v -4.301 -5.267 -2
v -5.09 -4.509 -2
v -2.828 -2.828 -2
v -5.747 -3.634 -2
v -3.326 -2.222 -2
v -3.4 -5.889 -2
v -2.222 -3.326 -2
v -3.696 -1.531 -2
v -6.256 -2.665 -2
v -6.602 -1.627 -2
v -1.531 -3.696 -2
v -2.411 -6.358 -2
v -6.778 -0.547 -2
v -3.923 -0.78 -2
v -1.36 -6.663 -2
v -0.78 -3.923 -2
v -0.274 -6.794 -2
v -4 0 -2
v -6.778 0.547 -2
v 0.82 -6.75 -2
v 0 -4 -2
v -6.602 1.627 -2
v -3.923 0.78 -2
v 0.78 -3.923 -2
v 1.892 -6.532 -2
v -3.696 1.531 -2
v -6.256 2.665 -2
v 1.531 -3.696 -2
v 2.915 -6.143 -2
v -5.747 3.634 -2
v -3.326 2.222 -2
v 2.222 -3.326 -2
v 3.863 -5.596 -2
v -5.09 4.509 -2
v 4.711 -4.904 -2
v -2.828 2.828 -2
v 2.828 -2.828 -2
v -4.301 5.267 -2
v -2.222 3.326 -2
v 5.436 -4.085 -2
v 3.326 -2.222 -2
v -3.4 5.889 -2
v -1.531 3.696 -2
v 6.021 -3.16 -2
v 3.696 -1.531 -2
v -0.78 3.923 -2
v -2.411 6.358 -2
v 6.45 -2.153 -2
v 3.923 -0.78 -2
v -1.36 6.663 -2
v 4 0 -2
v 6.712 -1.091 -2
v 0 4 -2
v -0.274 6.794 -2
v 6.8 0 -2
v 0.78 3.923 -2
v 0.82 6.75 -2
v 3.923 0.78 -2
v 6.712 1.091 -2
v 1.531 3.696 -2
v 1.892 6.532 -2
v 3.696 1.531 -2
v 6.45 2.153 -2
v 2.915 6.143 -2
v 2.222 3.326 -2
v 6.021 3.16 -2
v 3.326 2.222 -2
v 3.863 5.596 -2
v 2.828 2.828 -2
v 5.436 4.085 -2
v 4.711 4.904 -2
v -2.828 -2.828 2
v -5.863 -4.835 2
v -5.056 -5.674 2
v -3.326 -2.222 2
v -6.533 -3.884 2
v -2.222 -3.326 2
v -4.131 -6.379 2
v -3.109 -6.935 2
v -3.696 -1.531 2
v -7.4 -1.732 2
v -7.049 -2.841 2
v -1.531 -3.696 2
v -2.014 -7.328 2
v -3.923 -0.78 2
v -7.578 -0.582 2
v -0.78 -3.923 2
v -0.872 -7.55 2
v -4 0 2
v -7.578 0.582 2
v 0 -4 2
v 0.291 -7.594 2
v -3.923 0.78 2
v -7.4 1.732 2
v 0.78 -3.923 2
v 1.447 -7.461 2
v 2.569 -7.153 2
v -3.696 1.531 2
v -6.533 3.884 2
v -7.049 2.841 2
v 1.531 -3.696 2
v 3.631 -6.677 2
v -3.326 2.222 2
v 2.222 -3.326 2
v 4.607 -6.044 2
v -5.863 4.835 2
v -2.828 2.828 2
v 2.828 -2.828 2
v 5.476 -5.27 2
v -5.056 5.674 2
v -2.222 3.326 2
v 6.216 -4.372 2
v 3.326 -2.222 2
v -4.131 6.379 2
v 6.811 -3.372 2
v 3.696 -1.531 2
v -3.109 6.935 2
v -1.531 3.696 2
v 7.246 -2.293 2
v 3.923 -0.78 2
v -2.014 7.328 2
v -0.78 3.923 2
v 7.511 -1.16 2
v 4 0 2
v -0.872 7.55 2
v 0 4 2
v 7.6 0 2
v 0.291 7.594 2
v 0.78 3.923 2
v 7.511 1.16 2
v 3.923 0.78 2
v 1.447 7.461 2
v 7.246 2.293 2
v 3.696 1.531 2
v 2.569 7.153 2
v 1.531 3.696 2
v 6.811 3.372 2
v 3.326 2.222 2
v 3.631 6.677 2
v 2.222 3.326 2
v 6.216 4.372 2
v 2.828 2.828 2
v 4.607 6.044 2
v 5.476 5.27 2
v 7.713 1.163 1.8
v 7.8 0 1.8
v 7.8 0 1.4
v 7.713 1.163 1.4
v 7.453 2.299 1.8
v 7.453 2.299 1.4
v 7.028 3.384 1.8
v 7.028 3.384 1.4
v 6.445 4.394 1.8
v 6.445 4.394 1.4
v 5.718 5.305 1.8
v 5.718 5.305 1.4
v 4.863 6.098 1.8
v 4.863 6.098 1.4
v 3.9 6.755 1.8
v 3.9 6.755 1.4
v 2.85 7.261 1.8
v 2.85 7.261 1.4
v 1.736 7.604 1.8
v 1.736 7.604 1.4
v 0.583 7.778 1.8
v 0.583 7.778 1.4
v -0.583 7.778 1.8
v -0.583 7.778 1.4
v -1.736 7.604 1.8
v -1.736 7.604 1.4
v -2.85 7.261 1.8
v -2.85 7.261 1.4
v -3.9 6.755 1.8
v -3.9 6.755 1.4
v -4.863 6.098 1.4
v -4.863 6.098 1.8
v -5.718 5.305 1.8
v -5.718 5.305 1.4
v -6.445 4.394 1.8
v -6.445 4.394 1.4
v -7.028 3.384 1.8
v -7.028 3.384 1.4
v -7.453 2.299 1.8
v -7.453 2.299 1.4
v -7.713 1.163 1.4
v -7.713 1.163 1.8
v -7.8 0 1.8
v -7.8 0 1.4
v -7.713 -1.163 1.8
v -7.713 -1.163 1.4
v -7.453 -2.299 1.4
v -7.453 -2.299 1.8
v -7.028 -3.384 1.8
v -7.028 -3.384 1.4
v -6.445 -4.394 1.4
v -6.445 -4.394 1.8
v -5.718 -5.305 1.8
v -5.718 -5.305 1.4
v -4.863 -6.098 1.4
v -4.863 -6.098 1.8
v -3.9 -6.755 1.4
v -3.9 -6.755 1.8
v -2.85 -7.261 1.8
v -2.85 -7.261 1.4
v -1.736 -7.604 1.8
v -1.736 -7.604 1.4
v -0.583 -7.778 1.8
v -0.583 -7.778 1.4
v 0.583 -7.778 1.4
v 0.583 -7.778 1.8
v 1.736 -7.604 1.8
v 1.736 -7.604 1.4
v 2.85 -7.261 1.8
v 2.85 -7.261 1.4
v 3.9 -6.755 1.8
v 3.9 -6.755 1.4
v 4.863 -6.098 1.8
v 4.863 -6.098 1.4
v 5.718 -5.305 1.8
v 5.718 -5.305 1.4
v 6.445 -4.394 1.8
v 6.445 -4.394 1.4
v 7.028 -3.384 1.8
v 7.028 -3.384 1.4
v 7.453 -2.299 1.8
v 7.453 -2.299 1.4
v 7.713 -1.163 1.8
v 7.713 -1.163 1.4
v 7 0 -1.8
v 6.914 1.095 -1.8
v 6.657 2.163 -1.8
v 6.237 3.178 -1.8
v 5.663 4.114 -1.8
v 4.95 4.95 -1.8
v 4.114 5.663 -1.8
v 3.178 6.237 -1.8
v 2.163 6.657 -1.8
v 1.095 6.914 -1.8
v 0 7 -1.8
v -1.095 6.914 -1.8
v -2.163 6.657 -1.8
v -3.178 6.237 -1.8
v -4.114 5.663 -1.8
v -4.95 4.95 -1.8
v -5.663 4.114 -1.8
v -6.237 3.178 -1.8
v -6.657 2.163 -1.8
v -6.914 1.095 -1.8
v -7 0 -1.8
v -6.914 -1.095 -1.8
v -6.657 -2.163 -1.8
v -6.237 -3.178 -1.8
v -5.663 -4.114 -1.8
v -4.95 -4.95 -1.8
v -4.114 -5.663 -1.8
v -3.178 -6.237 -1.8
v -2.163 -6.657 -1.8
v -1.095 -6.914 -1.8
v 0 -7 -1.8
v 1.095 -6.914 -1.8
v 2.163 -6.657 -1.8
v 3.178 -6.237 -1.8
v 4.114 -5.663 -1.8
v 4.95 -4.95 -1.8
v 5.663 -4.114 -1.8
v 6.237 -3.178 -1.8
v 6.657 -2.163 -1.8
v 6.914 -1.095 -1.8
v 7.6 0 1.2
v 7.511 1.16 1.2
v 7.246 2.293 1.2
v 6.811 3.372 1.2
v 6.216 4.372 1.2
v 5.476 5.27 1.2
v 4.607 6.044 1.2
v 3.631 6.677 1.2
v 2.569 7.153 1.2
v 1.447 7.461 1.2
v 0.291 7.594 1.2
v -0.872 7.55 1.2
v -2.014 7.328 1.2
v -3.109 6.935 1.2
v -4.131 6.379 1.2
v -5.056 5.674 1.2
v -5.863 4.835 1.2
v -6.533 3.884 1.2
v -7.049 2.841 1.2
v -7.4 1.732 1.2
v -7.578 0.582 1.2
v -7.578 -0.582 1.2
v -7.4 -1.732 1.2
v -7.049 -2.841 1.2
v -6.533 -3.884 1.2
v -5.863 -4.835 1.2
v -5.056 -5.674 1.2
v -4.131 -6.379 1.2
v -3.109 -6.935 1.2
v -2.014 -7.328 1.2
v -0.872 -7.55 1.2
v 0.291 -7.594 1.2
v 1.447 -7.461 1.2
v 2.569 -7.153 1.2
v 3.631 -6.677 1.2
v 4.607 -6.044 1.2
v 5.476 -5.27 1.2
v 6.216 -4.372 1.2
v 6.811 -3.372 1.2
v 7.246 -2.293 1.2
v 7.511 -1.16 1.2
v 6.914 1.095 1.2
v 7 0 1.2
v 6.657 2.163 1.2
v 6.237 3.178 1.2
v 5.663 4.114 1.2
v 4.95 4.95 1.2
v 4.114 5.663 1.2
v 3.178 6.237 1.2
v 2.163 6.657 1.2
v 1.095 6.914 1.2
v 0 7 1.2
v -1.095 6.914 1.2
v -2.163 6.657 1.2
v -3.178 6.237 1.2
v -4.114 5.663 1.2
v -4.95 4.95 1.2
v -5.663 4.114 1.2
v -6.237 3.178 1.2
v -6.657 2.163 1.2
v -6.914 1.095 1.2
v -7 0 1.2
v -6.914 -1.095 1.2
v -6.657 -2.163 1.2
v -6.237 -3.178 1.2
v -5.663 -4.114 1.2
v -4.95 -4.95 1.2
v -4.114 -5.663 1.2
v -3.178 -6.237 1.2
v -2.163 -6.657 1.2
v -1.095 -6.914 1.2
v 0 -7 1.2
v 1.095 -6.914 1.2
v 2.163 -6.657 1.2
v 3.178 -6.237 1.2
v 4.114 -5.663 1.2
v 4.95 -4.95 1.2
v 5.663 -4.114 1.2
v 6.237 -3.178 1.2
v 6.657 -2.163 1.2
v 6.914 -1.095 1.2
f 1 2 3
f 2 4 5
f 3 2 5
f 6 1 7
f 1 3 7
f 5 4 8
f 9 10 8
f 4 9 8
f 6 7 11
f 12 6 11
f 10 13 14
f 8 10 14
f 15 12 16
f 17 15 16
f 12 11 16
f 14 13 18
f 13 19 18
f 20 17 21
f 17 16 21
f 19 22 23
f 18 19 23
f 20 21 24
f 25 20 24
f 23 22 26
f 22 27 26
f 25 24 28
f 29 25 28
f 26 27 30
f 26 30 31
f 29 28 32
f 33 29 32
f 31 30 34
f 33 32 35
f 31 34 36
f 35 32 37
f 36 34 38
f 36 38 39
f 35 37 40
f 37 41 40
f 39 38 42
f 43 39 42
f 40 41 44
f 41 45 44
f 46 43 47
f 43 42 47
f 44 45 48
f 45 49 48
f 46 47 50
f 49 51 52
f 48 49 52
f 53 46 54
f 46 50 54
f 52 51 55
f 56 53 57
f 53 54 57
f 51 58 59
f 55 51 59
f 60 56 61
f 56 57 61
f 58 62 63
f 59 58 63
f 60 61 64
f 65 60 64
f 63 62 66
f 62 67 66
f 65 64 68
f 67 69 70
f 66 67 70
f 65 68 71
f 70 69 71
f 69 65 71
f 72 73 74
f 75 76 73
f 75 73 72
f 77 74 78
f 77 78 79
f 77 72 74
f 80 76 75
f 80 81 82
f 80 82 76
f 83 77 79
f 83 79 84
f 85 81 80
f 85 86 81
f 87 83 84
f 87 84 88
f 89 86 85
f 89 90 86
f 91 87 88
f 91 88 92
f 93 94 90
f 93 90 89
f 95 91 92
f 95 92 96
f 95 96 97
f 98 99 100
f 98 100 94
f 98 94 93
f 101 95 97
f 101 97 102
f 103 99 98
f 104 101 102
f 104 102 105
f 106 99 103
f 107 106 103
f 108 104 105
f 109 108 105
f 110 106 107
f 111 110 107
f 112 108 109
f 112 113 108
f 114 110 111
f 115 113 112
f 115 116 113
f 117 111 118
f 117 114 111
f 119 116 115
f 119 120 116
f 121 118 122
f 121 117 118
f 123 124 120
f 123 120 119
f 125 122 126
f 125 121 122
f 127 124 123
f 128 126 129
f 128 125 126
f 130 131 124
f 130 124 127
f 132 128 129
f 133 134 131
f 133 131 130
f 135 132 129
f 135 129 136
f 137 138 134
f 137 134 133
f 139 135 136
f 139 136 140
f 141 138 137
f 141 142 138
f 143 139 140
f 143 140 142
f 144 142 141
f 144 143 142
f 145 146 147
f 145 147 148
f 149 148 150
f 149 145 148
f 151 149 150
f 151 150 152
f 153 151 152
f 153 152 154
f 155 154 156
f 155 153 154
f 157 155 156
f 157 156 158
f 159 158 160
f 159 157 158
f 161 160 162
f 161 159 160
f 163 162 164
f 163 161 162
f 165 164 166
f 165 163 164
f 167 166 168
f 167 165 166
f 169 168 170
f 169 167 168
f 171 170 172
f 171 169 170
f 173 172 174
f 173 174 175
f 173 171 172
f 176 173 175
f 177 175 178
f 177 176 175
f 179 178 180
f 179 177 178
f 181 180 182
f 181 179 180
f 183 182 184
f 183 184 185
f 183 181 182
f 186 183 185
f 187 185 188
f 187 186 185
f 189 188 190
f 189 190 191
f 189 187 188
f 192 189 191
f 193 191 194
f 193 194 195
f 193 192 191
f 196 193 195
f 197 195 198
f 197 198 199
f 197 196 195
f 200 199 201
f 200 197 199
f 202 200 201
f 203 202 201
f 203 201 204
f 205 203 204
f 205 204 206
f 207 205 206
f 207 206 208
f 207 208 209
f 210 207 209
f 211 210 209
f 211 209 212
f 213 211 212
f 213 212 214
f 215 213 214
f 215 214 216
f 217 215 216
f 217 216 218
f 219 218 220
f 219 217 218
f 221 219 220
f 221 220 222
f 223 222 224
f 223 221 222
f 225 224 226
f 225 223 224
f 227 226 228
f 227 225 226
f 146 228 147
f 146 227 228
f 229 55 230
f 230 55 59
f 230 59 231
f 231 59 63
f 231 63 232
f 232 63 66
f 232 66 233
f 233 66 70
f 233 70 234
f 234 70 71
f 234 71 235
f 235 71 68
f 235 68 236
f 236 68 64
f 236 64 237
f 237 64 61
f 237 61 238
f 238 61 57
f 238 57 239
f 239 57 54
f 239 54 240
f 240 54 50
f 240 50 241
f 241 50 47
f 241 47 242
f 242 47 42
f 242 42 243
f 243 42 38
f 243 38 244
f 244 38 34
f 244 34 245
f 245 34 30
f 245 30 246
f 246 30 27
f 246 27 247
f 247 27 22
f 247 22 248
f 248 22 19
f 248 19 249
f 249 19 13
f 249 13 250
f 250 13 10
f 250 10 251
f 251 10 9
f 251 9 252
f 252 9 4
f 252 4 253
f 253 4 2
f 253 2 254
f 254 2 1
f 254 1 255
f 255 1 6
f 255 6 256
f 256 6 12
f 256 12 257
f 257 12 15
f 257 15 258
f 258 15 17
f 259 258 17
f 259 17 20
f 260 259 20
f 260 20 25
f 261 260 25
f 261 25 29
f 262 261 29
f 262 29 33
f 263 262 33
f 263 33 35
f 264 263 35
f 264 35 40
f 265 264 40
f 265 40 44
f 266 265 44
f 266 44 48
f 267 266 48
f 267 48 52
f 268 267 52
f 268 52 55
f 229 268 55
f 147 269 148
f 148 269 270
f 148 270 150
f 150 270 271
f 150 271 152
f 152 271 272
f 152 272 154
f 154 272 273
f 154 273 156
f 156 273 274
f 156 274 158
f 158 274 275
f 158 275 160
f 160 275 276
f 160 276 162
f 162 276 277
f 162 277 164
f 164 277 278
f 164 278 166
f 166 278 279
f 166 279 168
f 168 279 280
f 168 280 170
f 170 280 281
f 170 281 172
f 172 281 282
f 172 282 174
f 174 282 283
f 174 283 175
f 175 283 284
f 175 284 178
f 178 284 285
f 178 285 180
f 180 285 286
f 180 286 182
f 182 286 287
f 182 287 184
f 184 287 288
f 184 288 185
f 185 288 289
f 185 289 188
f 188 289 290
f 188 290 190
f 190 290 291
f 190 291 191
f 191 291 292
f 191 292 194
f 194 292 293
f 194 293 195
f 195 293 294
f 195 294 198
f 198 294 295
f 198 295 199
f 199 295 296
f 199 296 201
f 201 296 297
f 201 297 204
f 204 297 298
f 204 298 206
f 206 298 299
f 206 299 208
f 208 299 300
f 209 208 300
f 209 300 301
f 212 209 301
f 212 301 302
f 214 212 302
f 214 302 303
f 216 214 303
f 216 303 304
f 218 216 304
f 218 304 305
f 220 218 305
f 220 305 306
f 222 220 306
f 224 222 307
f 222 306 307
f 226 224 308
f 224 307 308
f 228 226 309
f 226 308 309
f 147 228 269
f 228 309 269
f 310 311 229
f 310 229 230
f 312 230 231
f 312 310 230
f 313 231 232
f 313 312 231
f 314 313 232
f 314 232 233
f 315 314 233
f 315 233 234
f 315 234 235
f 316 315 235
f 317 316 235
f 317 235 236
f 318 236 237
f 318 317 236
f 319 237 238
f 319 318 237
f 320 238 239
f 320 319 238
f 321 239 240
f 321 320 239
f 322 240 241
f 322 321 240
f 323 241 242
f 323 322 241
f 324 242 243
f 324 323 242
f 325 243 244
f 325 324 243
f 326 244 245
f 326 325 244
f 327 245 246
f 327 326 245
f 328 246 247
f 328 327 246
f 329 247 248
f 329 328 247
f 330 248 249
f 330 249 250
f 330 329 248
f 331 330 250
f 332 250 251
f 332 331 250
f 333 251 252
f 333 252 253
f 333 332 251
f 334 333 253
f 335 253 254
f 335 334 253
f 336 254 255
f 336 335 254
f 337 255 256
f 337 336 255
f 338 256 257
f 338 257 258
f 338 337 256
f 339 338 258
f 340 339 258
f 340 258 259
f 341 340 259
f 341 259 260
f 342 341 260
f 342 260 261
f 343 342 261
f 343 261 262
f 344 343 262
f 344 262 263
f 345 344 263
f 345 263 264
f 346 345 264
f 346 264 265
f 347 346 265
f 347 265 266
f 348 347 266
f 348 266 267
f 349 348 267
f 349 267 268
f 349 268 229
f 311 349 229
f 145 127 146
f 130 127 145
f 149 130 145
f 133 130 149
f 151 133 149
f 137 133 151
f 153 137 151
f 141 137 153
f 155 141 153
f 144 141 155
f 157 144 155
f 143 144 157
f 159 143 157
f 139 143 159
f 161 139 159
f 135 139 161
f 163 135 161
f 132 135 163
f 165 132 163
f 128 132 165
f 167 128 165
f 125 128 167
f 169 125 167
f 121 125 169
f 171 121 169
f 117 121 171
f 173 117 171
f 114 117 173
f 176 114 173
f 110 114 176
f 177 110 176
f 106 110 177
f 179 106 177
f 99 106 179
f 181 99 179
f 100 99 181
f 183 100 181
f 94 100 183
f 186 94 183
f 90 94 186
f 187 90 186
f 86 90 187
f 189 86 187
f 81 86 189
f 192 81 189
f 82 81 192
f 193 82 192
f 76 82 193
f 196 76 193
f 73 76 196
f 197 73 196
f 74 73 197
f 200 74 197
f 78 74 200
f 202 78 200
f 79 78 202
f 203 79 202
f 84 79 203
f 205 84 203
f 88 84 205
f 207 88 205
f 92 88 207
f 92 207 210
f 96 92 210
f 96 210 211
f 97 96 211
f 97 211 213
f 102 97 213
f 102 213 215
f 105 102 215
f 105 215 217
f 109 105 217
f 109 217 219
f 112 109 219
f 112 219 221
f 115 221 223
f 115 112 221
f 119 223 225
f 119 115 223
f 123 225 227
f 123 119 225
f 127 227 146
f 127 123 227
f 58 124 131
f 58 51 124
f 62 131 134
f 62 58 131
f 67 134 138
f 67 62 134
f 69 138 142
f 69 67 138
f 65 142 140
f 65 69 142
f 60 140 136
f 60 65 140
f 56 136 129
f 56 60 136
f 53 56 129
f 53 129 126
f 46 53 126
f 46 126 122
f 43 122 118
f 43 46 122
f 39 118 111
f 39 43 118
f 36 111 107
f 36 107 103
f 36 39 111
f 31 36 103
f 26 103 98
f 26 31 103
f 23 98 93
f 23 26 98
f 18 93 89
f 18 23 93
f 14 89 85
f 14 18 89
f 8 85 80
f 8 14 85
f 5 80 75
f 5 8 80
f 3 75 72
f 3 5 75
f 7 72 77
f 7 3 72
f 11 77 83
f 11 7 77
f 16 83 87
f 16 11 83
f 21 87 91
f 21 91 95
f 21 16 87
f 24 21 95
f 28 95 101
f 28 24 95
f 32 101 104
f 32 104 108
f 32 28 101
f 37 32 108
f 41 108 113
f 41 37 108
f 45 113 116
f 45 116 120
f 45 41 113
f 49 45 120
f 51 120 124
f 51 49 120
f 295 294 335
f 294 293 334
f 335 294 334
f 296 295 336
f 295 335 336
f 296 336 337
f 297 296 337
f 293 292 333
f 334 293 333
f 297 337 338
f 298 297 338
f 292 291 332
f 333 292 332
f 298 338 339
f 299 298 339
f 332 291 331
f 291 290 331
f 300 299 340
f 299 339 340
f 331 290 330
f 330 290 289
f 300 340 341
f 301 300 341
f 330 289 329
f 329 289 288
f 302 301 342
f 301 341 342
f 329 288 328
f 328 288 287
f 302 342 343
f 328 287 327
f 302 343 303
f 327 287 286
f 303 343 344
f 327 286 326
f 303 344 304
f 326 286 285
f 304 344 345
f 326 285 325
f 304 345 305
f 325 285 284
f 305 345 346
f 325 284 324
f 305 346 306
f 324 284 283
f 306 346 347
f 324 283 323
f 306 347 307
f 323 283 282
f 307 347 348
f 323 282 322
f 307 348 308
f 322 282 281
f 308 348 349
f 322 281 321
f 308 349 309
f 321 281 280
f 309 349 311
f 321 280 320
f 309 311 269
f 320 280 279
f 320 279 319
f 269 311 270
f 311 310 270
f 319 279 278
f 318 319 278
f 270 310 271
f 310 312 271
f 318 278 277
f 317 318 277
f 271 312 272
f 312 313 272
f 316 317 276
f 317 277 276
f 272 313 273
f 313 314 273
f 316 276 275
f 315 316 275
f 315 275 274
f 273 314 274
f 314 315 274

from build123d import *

# Parameters (mm, degrees)
SKETCH_1_R      = 7
SKETCH_1_R_2    = 4
EXTRUDE_1_DEPTH = 2
SKETCH_2_R      = 7.8
SKETCH_2_R_2    = 4
EXTRUDE_2_DEPTH = 0.8
CHAMFER_1_SIZE  = 0.2


with BuildPart() as part:
    # 草图1 → 凸台-拉伸1 (new body, symmetric)
    with BuildSketch(Plane.XY):
        Circle(SKETCH_1_R)
        Circle(SKETCH_1_R_2, mode=Mode.SUBTRACT)
    extrude(amount=EXTRUDE_1_DEPTH, both=True)

    # 草图2 → 凸台-拉伸2 (add)
    with BuildSketch(Plane.XY.offset(2)):
        Circle(SKETCH_2_R)
        Circle(SKETCH_2_R_2, mode=Mode.SUBTRACT)
    extrude(amount=-EXTRUDE_2_DEPTH)

    # 倒角1
    chamfer_1_edges = [part.edges().sort_by_distance(p)[0] for p in [
        (-7.8, 0, 2),
        (-7.8, 0, 1.2),
        (-7, 0, -2),
    ]]
    chamfer(chamfer_1_edges, length=CHAMFER_1_SIZE)


solid = part.part
